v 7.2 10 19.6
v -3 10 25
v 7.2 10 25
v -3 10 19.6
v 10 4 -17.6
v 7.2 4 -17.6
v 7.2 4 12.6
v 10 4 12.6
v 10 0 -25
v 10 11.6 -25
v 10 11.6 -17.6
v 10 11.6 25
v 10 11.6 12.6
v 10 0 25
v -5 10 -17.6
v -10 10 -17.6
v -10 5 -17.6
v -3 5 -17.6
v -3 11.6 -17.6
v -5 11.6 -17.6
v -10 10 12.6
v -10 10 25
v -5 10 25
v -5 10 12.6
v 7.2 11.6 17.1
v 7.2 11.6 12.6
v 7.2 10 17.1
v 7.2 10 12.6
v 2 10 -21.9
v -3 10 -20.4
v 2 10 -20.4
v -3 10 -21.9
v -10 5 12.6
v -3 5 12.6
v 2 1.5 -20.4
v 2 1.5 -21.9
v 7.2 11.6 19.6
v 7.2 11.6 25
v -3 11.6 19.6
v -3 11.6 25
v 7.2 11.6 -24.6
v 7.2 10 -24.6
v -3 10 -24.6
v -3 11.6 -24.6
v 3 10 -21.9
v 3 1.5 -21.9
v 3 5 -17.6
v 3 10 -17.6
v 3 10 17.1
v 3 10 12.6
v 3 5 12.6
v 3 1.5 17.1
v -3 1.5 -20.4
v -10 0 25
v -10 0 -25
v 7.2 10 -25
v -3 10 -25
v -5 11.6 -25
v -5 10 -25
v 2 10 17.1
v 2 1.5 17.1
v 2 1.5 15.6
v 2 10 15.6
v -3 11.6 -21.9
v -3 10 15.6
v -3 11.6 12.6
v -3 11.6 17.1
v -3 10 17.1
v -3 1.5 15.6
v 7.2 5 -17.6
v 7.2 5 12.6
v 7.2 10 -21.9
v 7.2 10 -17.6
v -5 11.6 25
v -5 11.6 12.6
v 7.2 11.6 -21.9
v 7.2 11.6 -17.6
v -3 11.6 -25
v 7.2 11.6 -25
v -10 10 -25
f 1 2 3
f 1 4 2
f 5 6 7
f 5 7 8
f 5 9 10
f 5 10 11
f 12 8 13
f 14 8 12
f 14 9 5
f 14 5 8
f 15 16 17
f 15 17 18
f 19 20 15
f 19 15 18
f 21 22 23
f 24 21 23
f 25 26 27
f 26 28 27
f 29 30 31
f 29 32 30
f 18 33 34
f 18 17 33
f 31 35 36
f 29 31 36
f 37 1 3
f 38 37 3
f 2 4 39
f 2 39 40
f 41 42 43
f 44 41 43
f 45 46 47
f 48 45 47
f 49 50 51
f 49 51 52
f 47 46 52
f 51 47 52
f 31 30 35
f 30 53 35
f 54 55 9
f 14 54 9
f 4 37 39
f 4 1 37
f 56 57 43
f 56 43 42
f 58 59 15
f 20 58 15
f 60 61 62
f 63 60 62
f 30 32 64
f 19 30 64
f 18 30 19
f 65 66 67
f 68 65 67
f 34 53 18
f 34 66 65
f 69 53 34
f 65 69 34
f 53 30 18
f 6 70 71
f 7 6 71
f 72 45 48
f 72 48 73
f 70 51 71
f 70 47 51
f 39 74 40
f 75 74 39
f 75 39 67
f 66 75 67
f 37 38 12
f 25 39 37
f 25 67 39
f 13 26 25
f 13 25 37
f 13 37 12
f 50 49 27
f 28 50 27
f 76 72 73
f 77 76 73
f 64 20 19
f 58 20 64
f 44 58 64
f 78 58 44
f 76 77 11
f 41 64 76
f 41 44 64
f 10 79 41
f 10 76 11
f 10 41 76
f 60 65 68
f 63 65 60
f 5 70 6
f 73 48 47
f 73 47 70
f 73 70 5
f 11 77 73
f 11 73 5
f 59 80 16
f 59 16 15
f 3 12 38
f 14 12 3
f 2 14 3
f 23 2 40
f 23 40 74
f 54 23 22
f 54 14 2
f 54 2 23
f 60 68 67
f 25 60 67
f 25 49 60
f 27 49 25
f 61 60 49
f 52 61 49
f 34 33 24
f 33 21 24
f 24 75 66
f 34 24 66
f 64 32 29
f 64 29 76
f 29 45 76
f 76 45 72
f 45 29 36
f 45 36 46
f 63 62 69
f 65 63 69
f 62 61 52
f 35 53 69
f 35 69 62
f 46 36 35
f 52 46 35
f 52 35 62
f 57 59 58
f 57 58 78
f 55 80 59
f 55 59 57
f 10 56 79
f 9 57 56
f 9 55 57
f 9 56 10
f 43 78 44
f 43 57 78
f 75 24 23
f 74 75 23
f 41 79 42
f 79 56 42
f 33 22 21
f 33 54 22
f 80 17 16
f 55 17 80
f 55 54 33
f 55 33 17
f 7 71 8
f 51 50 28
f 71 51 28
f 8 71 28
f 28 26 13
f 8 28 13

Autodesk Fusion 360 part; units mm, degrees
sketch "Sketch1" plane through (0, 0, 0) normal (0, 1, 0) x (1, 0, 0)
  line L0 (10, -25) -> (-10, -25)
  line L1 (-10, -25) -> (-10, 25)
  line L2 (-10, 25) -> (10, 25)
  line L3 (10, 25) -> (10, -25)
  line L4 (10, -25) -> (-10, 25) construction
  line L5 (-10, -25) -> (10, 25) construction
  line L6 (0, 25) -> (0, -25) construction
  line L7 (-3, 25) -> (-3, -25)
  line L8 (3, 25) -> (3, -25)
  line L9 (7.2, 25) -> (7.2, -25)
  line L10 (-5, 25) -> (-5, -25)
  line L11 (-10, -12.6) -> (10, -12.6)
  line L12 (-10, 17.6) -> (10, 17.6)
  line L13 (10, 24.6) -> (-10, 24.6)
  line L14 (10, -19.6) -> (-10, -19.6)
  line L15 (-5, 21.9) -> (8.76, 21.9)
  line L16 (-10, 0) -> (10, 0) construction
  line L17 (-5, -17.1) -> (7.2, -17.1)
  line L18 (-3, 20.4) -> (2, 20.4)
  line L19 (2, 20.4) -> (2, 21.9)
  line L20 (2, 21.9) -> (-3, 21.9)
  line L21 (-3, 21.9) -> (-3, 20.4)
  line L22 (-3, -17.1) -> (2, -17.1)
  line L23 (2, -17.1) -> (2, -15.6)
  line L24 (2, -15.6) -> (-3, -15.6)
  line L25 (-3, -15.6) -> (-3, -17.1)
  line L26 (8.4, 17.6) -> (8.4, -12.6)
  dimension "d1" = 50
  dimension "d2" = 20
  dimension "d3" = 3
  dimension "d8" = 2.8
  dimension "d9" = 2
  dimension "d16" = 12.4
  dimension "d17" = 7.4
  dimension "d30" = 7
  dimension "d31" = 7
  dimension "d35" = 2.7
  dimension "d36" = 2.5
  dimension "d46" = 1.5
  dimension "d47" = 5
  dimension "d48" = 1.5
  dimension "d49" = 5
  dimension "d53" = 1.2
extrude "Extrude1" add sketch "Sketch1" along normal blind 1.5
extrude "Extrude2" add sketch "Sketch1" along normal blind 10 contours L0 L3 L9 L14 | L0 L8 L9 L14 | L3 L9 L11 L14 | L8 L9 L14 L17 | L3 L11 L12 L26 | L0 L7 L10 L14 | L8 L9 L11 L17 | L3 L9 L12 L13 | L9 L11 L12 L26 | L0 L1 L10 L14 | L7 L10 L14 L17 | L8 L9 L11 L12 | L2 L3 L9 L13 | L1 L10 L11 L14 | L7 L10 L11 L17 L25 | L8 L9 L12 L15 | L2 L8 L9 L13 | L8 L9 L13 L15 | L7 L10 L11 L12 | L1 L10 L11 L12 | L7 L10 L12 L15 L21 | L2 L7 L10 L13 | L7 L10 L13 L15 | L1 L10 L12 L13 | L1 L2 L10 L13
extrude "Extrude3" add sketch "Sketch1" along normal blind 1.6 from surface at 10 contours L0 L3 L9 L14 | L3 L9 L11 L14 | L3 L11 L12 L26 | L3 L9 L12 L13 | L9 L11 L12 L26 | L2 L3 L9 L13
extrude "Extrude4" add sketch "Sketch1" along normal blind 1.6 from surface at 10 contours L0 L7 L10 L14 | L7 L10 L14 L17 | L7 L10 L11 L17 L25 | L7 L10 L11 L12 | L7 L10 L12 L15 L21 | L2 L7 L10 L13 | L7 L10 L13 L15
extrude "Extrude6" cut sketch "Sketch1" against normal blind 5 from surface at 11.6 contours L3 L11 L12 L26 | L9 L11 L12 L26 | L7 L10 L11 L12
extrude "Extrude7" cut sketch "Sketch1" against normal blind 5 from surface at 10 contours L3 L11 L12 L26 | L9 L11 L12 L26 | L7 L10 L11 L12 | L1 L10 L11 L12
extrude "Extrude8" cut sketch "Sketch1" against normal blind 5 from surface at 10 contours L3 L11 L12 L26 | L9 L11 L12 L26 | L8 L9 L11 L12
extrude "Extrude9" add sketch "Sketch1" along normal up to surface (8.5 mm away) from surface at 1.5 contours L0 L7 L8 L14 | L2 L7 L8 L13
extrude "Extrude10" add sketch "Sketch1" along normal up to surface (8.5 mm away) from surface at 1.5 contours L7 L8 L14 L17 L22 | L7 L8 L13 L15 L20
extrude "Extrude11" add sketch "Sketch1" along normal up to surface (1.6 mm away) from surface at 10 contours L8 L9 L13 L15 | L7 L8 L13 L15 L20 | L7 L10 L13 L15
extrude "Extrude12" add sketch "Sketch1" along normal up to surface (1.6 mm away) from surface at 10 contours L8 L9 L14 L17 | L7 L8 L14 L17 L22
extrude "Extrude13" add sketch "Sketch1" along normal up to surface (8.5 mm away) from surface at 1.5 contours L7 L17 L22 L23 L24 L25 | L7 L15 L18 L19 L20 L21
extrude "Extrude14" cut sketch "Sketch1" against normal blind 1 from surface at 5 contours L3 L11 L12 L26 | L9 L11 L12 L26
